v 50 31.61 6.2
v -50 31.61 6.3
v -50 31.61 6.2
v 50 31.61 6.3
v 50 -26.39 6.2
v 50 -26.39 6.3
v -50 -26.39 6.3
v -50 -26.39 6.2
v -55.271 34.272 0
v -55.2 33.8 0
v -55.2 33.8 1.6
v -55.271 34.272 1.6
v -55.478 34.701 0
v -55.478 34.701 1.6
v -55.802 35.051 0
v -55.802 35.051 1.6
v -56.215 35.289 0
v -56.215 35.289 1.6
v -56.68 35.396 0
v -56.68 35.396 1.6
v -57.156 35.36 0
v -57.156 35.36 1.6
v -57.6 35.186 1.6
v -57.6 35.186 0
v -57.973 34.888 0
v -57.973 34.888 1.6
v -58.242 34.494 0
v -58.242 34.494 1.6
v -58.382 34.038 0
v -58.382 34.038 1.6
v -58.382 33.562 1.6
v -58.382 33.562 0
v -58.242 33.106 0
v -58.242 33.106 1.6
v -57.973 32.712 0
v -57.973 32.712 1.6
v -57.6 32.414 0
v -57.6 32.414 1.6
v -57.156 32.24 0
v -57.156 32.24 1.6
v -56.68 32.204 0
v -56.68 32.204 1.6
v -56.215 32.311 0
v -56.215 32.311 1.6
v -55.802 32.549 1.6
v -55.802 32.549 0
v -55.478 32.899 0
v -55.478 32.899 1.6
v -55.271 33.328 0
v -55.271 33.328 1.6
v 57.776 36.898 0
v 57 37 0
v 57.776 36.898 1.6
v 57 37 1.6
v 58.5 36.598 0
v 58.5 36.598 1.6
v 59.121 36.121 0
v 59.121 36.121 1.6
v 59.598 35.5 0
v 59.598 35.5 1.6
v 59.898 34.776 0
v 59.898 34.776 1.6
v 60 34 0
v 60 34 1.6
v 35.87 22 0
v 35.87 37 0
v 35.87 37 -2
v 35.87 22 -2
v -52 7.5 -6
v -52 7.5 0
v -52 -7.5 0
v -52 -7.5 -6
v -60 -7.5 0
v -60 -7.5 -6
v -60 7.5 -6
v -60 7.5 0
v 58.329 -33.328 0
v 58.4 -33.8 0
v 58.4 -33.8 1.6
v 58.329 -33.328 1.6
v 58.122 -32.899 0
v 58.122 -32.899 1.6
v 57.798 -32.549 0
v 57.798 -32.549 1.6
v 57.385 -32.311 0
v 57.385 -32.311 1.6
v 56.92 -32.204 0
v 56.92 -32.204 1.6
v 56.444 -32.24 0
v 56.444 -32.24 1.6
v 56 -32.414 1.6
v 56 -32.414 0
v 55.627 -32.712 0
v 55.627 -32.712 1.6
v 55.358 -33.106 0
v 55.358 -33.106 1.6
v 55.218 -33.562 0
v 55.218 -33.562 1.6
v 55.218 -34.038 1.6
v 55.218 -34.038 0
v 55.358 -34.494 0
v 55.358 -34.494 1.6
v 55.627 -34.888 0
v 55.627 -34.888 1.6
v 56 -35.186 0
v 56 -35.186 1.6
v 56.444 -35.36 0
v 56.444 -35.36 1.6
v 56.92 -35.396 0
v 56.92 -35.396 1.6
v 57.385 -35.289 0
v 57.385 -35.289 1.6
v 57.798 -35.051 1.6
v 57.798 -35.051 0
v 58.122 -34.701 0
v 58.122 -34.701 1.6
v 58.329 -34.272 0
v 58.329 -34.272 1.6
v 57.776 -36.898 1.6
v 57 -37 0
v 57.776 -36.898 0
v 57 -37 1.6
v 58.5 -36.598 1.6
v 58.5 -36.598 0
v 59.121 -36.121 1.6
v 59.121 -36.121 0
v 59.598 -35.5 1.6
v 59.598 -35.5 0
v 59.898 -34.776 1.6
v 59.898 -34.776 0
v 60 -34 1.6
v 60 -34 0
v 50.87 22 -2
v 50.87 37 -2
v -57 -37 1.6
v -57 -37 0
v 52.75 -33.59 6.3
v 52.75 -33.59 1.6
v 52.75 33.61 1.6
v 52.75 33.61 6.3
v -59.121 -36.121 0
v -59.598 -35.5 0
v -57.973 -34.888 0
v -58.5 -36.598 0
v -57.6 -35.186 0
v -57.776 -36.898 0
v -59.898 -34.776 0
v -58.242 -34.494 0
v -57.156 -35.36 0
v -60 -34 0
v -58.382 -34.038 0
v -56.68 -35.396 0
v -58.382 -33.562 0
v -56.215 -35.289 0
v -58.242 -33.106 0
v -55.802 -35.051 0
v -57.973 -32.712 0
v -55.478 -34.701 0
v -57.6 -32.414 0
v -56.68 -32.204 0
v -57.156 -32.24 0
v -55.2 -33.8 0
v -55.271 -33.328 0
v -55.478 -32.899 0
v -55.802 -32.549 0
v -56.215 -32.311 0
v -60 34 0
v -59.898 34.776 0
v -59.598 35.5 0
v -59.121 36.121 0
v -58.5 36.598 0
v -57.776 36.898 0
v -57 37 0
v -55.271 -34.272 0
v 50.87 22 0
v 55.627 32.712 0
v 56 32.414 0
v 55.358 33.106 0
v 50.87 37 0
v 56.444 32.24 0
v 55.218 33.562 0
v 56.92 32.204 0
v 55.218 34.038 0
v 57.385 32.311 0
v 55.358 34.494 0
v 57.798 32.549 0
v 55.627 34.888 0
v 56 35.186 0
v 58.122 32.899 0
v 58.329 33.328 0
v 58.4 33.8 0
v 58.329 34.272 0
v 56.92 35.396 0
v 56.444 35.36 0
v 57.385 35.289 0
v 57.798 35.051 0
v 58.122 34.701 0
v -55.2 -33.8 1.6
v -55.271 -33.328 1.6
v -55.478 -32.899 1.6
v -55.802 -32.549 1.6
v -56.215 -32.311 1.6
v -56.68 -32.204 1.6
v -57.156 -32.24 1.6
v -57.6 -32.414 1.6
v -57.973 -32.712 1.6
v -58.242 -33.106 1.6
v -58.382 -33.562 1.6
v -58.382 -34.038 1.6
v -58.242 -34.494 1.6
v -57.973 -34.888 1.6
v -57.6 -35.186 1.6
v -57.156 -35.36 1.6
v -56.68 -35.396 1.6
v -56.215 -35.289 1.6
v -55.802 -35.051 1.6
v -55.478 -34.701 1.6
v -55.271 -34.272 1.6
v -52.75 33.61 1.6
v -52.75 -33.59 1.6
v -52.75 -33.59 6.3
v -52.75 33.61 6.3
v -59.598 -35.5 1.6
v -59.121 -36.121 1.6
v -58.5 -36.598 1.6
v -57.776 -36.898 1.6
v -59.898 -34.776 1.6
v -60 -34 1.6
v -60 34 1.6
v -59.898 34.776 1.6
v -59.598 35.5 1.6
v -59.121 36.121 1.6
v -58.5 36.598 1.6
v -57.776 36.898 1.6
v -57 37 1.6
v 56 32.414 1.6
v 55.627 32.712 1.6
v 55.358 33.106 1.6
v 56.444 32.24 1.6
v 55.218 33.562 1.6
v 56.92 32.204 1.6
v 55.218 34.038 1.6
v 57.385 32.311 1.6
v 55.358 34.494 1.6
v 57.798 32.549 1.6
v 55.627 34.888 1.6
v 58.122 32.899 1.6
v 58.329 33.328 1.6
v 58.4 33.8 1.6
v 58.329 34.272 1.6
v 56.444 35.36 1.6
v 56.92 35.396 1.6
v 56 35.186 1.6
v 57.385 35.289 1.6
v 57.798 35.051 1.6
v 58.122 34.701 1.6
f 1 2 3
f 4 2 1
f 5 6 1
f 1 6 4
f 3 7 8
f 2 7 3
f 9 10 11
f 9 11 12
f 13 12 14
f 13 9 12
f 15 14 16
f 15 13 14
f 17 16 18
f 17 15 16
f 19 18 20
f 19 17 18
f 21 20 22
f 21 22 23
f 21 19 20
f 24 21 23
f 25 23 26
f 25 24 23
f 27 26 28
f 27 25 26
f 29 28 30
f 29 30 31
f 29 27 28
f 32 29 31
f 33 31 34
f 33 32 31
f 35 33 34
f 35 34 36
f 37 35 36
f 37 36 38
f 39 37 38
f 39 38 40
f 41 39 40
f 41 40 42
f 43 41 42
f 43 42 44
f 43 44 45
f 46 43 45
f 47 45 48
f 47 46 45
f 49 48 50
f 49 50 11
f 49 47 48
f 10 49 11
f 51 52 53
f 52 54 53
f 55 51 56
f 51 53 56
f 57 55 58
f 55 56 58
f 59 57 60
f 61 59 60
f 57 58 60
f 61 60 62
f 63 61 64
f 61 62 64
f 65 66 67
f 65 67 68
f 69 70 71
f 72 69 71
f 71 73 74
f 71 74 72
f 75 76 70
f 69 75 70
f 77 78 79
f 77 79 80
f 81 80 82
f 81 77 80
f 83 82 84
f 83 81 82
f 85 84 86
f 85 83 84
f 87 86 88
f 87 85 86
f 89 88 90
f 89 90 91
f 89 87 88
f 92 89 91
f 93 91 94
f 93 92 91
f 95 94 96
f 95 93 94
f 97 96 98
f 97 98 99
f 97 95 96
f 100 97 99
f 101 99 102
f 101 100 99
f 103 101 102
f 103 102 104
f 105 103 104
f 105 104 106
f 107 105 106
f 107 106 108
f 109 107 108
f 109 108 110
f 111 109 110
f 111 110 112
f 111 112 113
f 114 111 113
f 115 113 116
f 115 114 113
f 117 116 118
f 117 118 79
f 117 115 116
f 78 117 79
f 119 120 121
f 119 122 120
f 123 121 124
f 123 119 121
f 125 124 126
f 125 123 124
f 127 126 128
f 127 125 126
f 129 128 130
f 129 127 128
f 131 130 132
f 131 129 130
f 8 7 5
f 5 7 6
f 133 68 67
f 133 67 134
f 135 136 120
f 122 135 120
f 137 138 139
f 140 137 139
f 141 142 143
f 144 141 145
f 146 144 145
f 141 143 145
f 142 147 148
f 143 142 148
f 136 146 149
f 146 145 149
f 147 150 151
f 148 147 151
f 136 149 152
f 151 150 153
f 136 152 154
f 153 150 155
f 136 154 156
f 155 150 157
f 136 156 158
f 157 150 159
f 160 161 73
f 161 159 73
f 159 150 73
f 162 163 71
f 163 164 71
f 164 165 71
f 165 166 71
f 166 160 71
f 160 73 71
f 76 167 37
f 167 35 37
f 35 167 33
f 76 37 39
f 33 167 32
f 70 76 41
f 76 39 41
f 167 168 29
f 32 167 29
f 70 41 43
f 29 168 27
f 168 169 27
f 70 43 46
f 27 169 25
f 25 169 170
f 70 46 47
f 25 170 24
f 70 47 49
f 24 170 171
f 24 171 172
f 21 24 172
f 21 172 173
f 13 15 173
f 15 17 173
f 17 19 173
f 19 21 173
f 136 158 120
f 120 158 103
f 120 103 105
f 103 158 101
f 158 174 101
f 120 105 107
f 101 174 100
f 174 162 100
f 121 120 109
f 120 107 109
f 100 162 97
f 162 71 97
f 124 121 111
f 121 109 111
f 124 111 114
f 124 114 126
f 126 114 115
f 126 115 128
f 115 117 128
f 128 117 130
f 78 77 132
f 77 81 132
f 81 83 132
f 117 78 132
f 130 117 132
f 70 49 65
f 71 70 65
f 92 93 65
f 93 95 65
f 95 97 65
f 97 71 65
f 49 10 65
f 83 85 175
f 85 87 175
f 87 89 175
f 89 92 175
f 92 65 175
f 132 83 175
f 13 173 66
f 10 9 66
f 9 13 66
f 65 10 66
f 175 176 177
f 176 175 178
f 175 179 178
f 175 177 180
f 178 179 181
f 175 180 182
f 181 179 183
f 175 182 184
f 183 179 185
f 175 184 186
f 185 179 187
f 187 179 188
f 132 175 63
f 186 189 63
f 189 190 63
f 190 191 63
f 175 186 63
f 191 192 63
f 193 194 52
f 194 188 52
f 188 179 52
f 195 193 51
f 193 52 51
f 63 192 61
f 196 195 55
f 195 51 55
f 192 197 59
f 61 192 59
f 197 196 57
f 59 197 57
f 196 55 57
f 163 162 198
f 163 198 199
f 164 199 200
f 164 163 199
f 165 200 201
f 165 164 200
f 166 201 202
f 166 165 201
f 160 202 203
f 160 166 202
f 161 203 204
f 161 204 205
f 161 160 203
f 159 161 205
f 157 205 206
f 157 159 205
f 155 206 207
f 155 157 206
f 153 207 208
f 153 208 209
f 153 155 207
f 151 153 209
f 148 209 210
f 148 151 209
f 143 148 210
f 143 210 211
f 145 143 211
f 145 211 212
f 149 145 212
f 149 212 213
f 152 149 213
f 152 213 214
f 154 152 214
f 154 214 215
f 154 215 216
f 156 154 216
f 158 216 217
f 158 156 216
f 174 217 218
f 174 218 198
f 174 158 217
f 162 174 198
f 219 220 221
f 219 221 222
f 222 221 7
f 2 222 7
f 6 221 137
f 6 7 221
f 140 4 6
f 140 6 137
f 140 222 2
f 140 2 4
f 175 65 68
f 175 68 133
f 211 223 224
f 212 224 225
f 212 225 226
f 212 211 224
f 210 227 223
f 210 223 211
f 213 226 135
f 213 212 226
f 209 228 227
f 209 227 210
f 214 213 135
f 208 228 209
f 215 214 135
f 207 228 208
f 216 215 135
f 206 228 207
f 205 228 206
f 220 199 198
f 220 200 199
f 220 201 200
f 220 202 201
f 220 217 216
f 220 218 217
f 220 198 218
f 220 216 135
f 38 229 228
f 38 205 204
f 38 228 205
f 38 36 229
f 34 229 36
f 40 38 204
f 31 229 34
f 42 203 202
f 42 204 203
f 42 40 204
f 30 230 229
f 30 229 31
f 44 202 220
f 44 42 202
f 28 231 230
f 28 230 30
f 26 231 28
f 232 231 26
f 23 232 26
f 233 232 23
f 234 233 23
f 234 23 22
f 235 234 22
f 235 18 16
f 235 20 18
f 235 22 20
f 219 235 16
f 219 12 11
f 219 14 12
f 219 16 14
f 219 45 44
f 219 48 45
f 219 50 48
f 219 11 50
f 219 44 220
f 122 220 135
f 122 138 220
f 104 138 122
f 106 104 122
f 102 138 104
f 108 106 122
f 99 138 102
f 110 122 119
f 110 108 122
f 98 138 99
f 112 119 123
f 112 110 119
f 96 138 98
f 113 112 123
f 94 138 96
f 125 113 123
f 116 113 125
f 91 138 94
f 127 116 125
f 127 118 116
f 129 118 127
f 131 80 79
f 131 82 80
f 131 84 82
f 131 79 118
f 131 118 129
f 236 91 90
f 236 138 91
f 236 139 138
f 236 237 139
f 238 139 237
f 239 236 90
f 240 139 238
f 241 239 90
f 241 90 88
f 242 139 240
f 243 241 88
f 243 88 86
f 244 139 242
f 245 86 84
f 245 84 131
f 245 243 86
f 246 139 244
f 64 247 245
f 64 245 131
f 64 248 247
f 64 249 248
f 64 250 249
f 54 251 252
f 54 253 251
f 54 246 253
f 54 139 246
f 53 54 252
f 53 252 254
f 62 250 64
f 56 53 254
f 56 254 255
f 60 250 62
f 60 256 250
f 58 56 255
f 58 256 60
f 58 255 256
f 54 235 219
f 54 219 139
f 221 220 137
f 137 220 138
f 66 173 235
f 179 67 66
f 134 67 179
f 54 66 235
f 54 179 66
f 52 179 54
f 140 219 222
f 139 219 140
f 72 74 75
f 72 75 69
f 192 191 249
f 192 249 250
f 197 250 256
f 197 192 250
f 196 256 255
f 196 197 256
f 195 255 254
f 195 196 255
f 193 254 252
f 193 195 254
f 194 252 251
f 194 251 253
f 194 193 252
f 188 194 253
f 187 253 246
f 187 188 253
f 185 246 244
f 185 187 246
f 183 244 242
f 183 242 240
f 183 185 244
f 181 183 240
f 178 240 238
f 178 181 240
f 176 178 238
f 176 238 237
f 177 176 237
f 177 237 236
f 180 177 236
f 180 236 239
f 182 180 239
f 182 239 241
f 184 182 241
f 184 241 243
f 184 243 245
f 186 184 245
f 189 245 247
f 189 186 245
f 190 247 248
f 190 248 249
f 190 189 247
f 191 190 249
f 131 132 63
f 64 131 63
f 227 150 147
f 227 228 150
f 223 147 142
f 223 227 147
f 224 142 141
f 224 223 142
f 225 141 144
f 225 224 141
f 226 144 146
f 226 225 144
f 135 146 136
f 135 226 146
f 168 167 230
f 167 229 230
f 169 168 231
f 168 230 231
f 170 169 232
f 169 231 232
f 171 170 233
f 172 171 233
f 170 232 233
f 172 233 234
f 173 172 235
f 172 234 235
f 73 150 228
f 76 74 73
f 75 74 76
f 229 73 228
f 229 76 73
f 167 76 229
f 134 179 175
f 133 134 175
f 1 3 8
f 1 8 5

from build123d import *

# Parameters (mm, degrees)
F0_W     = 120
F0_H     = 74
F0_R     = 1.6
F1_DEPTH = 1.6
F2_W     = 105.5
F2_H     = 67.2
F3_DEPTH = 4.7
F4_W     = 100
F4_H     = 58
F5_DEPTH = 0.1
F6_W     = 15
F6_H     = 15
F7_DEPTH = 2
F6_W_2   = 8
F8_DEPTH = 6
F9_R     = 3


with BuildPart() as f1:
    # F0 (on Top) → F1 (new body)
    with BuildSketch(Plane.XY):
        Rectangle(F0_W, F0_H)
        with Locations((-56.8, -33.8)):
            Circle(F0_R, mode=Mode.SUBTRACT)
        with Locations((56.8, -33.8)):
            Circle(F0_R, mode=Mode.SUBTRACT)
        with Locations((-56.8, 33.8)):
            Circle(F0_R, mode=Mode.SUBTRACT)
        with Locations((56.8, 33.8)):
            Circle(F0_R, mode=Mode.SUBTRACT)
    extrude(amount=F1_DEPTH)

    # F2 (on face) → F3 (join)
    with BuildSketch(Plane.XY.offset(1.6)):
        with Locations((0, 0.01)):
            Rectangle(F2_W, F2_H)
    extrude(amount=F3_DEPTH)

    # F4 (on face) → F5 (cut)
    with BuildSketch(Plane.XY.offset(6.3)):
        with Locations((0, 2.61)):
            Rectangle(F4_W, F4_H)
    extrude(amount=-F5_DEPTH, mode=Mode.SUBTRACT)

    # F6 (on face) → F7 (join)
    with BuildSketch(Plane(origin=(0, 0, 0), x_dir=(1, 0, 0), z_dir=(0, 0, -1))):
        with Locations((43.37, -29.5)):
            Rectangle(F6_W, F6_H)
    extrude(amount=F7_DEPTH)

    # F6 (on face) → F8 (join)
    with BuildSketch(Plane(origin=(0, 0, 0), x_dir=(1, 0, 0), z_dir=(0, 0, -1))):
        with Locations((-56, 0)):
            Rectangle(F6_W_2, F6_H)
    extrude(amount=F8_DEPTH)

    # F9
    f9_edges = [f1.edges().sort_by_distance(p)[0] for p in [
        (60, 37, 0.8),
        (60, -37, 0.8),
        (-60, -37, 0.8),
        (-60, 37, 0.8),
    ]]
    fillet(f9_edges, radius=F9_R)


solid = f1.part
